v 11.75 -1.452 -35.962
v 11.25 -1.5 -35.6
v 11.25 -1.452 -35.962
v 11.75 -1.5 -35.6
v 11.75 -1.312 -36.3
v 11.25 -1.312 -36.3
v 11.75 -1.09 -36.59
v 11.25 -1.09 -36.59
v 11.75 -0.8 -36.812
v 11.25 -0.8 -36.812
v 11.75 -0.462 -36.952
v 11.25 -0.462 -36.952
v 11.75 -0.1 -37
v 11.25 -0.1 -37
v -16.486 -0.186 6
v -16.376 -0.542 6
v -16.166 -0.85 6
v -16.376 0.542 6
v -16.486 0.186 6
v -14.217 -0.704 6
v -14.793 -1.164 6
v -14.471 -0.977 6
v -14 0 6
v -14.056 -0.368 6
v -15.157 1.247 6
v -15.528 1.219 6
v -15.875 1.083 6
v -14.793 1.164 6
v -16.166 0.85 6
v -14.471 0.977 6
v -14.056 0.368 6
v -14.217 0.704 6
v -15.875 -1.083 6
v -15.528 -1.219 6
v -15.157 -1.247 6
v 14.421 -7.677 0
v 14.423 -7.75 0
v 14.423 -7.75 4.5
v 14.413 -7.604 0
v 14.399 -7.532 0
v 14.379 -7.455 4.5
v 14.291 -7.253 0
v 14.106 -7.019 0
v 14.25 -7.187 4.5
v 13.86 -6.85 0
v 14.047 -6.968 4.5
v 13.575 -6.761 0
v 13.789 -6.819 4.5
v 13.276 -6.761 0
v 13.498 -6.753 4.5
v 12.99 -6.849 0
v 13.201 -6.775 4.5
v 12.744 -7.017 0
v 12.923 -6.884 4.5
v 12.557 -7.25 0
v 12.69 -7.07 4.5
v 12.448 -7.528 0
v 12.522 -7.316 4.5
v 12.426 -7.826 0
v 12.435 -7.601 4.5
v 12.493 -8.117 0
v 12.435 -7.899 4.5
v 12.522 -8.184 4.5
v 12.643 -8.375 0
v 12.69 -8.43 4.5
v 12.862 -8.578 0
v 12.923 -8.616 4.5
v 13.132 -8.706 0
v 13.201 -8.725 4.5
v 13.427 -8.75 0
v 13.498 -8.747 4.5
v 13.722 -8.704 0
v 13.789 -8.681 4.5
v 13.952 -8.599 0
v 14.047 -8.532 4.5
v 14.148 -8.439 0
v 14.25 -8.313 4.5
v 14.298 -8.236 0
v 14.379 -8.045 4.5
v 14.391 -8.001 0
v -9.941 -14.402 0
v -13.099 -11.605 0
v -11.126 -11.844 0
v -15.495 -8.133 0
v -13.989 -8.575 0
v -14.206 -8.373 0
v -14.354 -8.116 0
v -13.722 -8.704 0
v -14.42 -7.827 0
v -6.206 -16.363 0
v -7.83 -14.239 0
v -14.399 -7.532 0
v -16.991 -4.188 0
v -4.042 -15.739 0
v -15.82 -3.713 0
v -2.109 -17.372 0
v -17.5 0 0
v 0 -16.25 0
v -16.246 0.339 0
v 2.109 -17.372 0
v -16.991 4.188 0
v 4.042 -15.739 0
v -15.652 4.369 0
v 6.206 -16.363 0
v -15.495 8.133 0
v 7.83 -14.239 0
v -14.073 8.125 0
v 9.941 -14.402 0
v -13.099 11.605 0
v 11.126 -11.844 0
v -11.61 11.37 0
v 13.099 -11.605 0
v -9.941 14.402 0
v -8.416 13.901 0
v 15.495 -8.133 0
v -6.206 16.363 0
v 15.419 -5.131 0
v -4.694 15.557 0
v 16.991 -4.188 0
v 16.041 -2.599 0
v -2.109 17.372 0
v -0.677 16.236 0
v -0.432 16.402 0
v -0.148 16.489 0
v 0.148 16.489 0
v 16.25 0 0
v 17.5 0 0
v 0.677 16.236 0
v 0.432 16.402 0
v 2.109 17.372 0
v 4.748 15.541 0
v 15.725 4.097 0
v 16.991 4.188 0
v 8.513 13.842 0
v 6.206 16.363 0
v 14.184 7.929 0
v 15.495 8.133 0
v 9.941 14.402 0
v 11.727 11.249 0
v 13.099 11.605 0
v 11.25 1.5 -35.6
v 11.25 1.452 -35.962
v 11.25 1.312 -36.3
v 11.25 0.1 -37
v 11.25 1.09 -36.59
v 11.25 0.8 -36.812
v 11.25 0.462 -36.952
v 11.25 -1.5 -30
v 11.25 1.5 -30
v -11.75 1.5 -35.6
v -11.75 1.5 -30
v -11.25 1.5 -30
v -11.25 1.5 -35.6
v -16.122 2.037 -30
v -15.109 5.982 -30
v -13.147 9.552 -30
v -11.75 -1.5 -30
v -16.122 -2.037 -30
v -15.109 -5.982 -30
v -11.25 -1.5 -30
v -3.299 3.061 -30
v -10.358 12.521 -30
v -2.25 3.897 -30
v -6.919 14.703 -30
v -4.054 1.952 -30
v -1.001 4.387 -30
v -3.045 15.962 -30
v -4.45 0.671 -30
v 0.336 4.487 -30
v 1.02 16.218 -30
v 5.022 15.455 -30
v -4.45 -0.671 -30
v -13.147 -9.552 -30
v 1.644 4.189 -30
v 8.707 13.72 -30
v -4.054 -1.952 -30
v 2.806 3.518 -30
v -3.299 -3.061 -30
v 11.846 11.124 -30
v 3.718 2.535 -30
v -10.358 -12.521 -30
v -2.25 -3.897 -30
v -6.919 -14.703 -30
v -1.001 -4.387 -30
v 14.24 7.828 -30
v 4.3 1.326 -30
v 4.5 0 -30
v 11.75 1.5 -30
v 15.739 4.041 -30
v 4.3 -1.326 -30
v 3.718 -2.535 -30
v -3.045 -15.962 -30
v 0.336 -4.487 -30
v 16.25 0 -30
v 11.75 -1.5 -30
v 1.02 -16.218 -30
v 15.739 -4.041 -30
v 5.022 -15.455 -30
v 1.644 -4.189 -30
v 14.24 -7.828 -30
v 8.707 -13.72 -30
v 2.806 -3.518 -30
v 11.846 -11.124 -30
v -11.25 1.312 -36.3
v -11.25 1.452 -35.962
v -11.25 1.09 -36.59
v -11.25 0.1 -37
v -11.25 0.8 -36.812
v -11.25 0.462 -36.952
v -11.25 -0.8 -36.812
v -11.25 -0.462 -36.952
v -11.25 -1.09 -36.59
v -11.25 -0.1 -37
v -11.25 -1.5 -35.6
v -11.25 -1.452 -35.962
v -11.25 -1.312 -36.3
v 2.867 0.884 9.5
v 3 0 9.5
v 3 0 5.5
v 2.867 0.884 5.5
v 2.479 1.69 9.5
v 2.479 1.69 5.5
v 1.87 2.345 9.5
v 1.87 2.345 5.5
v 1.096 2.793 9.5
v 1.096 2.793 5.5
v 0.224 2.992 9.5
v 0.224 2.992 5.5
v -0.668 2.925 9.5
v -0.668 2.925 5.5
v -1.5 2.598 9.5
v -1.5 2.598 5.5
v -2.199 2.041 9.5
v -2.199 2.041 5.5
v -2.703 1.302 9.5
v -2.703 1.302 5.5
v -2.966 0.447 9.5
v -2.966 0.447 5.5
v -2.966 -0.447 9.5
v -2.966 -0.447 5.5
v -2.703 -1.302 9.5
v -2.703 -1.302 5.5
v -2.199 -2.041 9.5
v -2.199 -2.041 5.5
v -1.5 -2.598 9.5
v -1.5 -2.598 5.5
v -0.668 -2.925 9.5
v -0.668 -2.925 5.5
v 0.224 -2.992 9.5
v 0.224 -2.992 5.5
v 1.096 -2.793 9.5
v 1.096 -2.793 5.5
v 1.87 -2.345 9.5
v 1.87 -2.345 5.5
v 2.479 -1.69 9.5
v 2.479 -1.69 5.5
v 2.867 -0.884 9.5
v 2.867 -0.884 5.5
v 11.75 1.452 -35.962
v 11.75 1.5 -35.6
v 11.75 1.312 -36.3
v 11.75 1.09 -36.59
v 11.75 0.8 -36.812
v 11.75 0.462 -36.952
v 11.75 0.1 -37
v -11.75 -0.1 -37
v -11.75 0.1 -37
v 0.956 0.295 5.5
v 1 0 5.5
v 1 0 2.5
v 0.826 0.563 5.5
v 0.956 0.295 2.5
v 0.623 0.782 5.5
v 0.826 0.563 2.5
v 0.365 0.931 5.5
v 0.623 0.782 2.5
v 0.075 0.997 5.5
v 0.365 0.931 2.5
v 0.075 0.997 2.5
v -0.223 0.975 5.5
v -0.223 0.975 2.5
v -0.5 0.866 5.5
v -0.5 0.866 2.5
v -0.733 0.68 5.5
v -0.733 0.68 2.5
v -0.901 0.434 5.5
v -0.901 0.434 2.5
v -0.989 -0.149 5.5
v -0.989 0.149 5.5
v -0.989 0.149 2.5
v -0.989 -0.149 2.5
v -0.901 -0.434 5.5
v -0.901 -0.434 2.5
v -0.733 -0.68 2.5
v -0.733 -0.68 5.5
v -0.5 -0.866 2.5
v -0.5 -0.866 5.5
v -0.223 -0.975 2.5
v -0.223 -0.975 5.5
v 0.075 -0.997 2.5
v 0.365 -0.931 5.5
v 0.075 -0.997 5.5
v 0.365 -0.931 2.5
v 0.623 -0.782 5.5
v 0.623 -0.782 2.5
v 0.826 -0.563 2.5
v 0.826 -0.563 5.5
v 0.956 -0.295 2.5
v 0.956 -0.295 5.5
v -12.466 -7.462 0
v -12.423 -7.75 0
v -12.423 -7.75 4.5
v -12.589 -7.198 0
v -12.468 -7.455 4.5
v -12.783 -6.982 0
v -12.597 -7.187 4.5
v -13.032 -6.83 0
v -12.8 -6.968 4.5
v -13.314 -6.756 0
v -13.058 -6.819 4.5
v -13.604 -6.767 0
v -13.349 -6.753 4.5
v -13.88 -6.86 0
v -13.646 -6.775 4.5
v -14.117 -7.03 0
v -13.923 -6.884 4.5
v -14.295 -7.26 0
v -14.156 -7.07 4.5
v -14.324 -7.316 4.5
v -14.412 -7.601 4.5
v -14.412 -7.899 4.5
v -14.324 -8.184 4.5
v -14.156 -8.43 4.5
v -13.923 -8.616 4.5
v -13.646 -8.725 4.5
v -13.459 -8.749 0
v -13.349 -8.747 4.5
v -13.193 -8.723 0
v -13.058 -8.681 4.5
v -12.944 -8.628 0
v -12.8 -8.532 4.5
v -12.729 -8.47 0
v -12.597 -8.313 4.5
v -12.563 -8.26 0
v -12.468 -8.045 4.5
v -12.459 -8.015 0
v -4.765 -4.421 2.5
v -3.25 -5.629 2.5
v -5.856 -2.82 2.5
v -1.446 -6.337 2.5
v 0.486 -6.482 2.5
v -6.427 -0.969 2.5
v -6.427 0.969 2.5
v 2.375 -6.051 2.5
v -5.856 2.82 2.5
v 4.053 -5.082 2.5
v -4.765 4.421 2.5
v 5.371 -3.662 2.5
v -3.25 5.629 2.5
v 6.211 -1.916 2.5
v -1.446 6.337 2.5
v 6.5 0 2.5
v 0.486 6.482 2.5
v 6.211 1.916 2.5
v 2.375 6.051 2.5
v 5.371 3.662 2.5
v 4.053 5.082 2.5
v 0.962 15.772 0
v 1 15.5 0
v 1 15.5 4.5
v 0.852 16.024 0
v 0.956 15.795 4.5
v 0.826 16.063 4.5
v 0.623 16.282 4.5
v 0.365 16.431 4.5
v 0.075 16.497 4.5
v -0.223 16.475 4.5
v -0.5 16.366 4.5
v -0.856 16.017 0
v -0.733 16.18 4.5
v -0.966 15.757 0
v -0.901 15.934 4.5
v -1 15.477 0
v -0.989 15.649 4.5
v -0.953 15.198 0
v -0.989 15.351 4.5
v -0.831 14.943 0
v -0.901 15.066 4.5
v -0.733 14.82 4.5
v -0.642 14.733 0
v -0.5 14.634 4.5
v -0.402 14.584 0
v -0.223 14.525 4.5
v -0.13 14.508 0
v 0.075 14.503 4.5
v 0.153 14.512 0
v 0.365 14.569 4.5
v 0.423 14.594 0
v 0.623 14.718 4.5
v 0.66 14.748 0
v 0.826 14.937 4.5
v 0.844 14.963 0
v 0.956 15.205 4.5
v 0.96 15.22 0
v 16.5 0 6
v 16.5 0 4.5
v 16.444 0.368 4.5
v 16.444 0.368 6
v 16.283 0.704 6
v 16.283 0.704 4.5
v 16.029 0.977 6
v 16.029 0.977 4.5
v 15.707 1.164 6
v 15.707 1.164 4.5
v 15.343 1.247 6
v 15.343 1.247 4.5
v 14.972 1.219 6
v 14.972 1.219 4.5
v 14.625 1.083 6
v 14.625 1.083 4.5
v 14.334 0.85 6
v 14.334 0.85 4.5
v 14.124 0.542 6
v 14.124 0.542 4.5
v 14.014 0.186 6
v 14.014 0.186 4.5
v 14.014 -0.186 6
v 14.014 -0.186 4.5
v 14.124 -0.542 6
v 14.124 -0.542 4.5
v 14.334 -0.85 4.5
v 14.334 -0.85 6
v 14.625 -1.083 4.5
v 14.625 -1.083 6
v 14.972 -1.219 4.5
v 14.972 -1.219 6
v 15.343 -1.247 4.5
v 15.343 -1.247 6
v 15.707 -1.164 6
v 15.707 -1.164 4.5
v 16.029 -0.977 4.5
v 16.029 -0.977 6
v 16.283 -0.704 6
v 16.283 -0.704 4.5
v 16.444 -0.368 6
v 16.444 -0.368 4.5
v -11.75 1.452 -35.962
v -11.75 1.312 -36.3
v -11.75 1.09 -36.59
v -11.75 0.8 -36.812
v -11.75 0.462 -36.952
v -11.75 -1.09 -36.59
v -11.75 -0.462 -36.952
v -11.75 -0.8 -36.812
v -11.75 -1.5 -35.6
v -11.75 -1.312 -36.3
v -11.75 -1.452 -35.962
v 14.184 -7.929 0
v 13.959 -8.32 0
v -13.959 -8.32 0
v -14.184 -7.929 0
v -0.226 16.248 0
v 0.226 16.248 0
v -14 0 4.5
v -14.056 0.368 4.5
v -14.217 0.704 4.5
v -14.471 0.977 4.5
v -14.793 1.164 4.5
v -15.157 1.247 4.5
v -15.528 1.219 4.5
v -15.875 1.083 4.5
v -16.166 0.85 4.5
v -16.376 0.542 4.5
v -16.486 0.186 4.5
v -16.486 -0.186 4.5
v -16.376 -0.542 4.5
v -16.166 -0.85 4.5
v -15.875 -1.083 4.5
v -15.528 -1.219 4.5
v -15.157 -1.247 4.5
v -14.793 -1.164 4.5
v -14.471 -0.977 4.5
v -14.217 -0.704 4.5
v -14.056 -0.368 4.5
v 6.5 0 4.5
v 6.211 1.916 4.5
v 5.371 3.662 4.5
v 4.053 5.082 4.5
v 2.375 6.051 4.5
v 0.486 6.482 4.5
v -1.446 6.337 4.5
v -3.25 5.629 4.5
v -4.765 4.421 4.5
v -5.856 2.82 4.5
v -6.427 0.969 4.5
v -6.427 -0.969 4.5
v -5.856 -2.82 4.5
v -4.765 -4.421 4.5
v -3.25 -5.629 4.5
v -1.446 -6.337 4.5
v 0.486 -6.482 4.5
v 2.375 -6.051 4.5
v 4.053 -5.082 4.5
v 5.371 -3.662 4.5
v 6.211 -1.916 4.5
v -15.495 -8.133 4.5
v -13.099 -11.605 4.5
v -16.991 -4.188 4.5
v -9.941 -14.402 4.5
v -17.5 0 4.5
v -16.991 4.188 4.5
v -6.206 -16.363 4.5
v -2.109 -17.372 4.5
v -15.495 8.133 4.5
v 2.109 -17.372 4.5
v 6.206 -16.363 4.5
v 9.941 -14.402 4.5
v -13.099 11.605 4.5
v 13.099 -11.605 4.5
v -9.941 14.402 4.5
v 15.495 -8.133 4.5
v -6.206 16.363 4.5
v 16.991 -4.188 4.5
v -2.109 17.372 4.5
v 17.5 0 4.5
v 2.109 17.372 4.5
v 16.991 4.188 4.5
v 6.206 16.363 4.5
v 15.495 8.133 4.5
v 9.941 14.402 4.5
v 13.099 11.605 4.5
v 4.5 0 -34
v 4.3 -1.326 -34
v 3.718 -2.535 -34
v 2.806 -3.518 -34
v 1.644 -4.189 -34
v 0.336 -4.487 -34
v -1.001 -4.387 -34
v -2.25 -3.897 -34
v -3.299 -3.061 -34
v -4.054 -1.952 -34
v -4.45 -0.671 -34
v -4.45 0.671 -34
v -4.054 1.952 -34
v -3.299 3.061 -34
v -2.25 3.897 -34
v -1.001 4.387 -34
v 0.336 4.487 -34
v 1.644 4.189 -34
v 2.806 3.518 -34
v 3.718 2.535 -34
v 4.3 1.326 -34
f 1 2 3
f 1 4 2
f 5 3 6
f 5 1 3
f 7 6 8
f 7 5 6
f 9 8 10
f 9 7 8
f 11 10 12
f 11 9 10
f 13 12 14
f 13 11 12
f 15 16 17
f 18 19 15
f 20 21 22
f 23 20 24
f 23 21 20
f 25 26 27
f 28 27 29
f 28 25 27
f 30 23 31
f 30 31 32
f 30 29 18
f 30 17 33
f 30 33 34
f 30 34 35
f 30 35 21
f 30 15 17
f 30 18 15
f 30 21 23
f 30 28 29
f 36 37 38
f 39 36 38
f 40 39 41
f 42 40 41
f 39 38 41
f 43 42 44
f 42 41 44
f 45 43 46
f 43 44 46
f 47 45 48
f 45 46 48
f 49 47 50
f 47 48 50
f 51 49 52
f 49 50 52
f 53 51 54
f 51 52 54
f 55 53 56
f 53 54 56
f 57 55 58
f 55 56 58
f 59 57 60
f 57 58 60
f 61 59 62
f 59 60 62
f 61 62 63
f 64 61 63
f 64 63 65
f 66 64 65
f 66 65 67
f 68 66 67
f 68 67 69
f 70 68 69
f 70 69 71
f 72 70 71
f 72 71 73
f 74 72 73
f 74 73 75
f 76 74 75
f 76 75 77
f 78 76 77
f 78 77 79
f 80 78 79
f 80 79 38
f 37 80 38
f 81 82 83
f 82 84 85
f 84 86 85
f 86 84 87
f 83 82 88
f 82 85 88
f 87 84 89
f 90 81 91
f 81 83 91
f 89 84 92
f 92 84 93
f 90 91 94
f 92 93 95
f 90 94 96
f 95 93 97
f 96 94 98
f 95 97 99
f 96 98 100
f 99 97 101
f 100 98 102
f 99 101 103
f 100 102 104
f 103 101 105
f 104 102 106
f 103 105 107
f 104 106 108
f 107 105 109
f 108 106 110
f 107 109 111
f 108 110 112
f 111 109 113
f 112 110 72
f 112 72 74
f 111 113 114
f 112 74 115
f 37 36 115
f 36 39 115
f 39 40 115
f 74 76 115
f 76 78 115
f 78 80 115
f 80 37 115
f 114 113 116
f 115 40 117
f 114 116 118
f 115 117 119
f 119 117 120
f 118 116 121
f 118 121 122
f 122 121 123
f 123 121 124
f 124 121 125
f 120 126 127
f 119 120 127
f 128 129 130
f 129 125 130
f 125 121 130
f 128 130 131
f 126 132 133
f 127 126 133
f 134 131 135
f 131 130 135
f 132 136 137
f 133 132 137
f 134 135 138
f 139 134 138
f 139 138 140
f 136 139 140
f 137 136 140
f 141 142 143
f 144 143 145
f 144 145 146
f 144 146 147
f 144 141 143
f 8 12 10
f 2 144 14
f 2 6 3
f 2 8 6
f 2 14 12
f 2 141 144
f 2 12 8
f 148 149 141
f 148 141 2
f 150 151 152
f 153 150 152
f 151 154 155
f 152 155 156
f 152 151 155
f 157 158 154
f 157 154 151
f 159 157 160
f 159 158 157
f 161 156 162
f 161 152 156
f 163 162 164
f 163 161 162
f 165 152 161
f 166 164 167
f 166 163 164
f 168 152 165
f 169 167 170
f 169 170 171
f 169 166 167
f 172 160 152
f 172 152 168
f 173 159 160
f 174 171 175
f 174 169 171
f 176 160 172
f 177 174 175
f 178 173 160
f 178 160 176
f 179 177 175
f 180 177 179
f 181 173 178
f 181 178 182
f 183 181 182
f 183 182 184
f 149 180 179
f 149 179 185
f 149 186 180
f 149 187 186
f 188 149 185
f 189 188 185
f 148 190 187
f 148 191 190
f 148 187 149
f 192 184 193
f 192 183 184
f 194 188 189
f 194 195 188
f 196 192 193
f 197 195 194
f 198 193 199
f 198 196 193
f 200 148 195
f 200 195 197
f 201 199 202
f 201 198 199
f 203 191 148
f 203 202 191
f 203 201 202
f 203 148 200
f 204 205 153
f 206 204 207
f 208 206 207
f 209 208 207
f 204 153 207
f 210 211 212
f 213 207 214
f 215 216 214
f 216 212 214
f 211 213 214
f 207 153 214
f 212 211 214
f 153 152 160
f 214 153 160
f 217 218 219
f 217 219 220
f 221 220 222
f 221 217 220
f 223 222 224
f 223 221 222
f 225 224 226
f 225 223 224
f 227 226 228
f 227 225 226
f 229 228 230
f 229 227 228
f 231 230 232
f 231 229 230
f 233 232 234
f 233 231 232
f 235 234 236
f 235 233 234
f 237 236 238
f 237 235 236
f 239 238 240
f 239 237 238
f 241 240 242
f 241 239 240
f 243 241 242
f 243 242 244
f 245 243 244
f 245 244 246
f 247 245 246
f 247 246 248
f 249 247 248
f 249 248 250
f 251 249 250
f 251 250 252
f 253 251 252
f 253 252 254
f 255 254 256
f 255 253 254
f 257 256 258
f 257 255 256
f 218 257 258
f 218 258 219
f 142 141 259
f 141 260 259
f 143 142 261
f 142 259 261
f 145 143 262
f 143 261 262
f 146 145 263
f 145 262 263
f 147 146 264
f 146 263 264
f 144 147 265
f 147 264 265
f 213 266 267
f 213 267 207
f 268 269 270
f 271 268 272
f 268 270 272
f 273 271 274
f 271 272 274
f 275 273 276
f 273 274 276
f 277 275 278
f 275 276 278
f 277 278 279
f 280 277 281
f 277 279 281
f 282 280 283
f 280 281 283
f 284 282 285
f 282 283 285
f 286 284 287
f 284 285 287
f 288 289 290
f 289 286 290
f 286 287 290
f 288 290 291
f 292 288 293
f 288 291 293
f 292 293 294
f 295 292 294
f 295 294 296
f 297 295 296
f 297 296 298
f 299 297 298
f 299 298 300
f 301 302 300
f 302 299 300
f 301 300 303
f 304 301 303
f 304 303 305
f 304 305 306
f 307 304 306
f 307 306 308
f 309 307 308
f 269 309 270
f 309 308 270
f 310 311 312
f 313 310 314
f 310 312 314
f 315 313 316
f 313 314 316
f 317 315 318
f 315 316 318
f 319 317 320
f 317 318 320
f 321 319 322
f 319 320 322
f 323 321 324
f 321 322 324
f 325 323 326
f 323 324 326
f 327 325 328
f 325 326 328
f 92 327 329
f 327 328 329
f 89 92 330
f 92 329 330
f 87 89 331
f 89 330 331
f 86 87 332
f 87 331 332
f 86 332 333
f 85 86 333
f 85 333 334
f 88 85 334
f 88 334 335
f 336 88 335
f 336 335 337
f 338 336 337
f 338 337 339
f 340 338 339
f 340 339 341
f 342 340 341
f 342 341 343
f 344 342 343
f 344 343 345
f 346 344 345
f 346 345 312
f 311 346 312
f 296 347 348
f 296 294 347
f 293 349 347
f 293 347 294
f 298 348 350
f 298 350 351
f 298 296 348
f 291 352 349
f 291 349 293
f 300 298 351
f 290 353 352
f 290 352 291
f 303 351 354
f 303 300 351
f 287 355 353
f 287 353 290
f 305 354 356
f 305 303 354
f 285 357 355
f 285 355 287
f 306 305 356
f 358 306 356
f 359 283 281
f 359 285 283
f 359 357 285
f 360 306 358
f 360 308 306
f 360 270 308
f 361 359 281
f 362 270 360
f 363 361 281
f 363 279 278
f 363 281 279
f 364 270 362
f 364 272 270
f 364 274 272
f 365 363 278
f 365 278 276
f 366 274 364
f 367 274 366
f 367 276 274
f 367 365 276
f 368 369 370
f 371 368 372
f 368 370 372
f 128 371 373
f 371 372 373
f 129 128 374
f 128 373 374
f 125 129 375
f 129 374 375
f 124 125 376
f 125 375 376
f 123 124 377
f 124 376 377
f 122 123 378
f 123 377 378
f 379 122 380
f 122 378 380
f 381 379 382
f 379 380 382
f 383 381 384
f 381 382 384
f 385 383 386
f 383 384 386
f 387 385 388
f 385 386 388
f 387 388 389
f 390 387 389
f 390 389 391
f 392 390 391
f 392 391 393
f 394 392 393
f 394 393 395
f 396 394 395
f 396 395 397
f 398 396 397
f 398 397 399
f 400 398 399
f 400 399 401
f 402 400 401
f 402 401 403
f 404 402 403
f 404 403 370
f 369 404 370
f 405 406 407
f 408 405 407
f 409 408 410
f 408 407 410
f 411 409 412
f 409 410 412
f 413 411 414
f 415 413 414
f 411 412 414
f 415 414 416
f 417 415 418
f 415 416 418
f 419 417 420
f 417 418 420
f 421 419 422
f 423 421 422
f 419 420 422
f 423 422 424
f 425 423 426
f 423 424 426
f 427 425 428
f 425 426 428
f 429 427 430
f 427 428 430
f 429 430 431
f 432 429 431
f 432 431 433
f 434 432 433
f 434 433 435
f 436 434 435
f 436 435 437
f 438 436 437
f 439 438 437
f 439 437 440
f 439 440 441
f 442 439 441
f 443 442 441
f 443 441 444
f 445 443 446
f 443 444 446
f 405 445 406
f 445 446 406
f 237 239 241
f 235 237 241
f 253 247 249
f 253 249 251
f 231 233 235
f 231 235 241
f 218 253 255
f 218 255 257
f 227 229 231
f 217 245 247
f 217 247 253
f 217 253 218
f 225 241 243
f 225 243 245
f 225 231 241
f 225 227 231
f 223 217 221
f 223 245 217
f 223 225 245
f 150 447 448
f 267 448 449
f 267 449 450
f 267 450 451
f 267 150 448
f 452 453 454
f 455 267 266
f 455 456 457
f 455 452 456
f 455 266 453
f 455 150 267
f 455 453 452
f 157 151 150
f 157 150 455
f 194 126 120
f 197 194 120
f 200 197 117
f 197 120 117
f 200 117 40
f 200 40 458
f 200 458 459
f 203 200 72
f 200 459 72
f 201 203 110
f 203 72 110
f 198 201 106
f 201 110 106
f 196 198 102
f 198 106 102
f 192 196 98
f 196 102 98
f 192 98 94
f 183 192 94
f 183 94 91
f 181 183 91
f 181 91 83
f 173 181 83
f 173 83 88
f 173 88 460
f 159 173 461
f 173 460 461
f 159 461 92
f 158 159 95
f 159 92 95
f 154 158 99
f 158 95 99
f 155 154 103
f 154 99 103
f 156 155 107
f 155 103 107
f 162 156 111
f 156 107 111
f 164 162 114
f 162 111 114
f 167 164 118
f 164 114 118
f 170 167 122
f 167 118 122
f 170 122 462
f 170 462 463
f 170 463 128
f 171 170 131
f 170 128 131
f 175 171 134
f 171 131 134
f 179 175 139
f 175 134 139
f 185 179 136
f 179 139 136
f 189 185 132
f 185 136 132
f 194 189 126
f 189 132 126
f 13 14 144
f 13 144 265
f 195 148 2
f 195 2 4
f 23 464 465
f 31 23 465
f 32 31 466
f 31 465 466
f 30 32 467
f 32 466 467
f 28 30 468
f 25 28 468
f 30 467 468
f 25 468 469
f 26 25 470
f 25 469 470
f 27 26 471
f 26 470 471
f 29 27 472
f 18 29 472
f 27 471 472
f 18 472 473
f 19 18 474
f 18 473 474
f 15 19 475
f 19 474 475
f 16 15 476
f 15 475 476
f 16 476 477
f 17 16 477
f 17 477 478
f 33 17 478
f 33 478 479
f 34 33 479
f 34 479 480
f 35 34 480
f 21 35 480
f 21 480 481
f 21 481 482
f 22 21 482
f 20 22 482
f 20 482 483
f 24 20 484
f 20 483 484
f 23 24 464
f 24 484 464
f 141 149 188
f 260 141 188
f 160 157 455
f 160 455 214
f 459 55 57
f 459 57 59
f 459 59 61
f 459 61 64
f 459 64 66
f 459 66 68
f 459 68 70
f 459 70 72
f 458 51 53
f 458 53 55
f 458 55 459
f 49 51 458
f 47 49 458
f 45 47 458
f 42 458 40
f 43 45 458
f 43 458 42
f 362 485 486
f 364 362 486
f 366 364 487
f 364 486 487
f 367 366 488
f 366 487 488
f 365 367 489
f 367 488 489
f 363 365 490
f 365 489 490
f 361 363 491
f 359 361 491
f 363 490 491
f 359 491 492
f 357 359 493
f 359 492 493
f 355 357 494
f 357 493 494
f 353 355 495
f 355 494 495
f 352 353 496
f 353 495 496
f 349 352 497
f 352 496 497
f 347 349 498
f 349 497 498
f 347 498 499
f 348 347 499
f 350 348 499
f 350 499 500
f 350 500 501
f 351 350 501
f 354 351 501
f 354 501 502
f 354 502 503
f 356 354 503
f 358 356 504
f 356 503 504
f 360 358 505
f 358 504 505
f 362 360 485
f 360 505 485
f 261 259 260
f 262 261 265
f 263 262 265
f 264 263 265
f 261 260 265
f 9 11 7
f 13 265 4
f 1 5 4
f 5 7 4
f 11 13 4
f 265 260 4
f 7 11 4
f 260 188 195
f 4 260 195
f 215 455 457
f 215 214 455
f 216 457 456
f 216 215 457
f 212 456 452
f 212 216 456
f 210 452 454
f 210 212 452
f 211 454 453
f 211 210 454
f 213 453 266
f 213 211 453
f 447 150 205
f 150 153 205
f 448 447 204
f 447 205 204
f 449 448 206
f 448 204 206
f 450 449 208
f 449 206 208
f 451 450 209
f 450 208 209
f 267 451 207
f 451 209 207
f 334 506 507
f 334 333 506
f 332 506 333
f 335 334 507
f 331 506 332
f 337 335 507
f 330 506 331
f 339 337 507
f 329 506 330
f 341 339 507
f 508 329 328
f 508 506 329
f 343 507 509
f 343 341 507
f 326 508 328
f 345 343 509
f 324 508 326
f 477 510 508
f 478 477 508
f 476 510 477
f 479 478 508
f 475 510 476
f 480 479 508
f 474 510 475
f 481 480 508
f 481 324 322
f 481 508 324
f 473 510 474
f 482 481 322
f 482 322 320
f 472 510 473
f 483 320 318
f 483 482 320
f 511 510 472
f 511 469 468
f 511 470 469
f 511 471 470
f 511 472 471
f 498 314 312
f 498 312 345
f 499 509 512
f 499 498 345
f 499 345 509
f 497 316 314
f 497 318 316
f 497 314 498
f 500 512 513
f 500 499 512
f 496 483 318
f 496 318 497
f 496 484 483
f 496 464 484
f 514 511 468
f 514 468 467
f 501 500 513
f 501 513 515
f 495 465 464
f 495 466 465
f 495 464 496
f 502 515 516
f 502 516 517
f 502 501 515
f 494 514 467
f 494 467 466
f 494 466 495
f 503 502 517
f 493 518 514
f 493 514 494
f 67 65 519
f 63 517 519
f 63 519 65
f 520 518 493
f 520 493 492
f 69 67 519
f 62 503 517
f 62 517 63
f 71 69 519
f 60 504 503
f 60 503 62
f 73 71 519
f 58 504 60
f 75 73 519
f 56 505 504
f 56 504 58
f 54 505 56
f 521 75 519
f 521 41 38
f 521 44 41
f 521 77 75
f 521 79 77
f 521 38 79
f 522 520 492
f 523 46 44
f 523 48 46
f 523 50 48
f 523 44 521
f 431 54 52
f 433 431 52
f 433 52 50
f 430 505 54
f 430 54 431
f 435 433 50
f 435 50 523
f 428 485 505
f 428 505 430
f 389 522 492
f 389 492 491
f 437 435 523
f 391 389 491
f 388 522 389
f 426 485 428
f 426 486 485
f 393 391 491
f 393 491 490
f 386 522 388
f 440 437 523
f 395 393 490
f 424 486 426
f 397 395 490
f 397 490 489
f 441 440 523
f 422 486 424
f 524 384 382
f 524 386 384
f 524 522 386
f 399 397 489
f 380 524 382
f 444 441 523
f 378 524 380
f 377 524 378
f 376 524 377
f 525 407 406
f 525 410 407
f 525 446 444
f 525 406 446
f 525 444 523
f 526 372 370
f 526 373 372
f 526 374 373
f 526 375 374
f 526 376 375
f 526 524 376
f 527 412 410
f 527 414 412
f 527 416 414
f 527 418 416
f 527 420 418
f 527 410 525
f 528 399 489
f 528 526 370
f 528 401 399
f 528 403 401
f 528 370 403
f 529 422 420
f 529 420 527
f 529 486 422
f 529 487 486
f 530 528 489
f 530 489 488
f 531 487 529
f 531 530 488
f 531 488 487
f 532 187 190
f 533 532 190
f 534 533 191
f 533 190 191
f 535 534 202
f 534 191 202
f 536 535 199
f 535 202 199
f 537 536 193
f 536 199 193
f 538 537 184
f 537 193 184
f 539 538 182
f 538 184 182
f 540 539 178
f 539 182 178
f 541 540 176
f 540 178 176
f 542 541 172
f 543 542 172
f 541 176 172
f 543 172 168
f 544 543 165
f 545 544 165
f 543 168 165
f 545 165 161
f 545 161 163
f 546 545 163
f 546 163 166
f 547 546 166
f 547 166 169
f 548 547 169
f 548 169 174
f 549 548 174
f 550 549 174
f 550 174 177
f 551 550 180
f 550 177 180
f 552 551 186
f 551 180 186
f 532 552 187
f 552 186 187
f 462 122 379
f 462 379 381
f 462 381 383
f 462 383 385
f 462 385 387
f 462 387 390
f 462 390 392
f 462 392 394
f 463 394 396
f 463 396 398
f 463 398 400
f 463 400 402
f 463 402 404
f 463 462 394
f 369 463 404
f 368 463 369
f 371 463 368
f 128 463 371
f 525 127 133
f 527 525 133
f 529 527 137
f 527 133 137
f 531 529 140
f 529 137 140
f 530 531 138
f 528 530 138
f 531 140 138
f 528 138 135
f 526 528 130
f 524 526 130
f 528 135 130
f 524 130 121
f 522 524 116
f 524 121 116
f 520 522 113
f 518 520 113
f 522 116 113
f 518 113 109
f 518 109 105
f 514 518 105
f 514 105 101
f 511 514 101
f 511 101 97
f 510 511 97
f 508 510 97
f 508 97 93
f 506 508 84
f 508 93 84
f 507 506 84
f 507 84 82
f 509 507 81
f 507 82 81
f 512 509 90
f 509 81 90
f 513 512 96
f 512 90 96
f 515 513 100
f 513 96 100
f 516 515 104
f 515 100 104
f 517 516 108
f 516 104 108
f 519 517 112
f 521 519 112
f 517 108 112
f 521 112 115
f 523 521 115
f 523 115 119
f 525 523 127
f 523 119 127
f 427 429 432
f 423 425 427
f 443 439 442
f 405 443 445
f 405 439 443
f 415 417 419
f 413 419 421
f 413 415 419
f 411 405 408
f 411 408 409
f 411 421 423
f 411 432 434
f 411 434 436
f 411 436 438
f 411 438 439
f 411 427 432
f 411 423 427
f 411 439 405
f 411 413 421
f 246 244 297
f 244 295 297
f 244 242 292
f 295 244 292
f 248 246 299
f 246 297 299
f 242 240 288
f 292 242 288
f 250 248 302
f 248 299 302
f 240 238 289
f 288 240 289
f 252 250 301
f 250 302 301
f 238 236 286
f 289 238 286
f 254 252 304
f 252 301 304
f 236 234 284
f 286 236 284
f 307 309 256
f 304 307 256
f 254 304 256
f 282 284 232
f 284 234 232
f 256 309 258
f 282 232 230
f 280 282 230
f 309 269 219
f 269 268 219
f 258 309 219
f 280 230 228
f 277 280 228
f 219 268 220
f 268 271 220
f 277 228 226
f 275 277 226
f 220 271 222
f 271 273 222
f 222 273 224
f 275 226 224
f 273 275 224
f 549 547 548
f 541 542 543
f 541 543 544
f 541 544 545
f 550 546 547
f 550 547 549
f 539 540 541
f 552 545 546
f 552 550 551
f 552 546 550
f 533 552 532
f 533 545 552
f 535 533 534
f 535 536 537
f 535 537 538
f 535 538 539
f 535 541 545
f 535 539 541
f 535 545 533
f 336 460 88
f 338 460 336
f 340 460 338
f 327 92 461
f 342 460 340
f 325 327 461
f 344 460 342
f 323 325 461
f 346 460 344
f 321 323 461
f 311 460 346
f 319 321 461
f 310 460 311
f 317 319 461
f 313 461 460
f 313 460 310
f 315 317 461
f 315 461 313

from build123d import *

# Parameters (mm, degrees)
SKETCH_R        = 17.5
PAD_DEPTH       = 4.5
SKETCH001_R     = 16.25
PAD001_DEPTH    = 30
SKETCH002_R     = 4.5
PAD002_DEPTH    = 4
SKETCH003_W     = 0.5
SKETCH003_H     = 3
PAD003_DEPTH    = 7
FILLET_R        = 1.4
SKETCH004_R     = 1.25
PAD004_DEPTH    = 1.5
SKETCH005_R     = 1
POCKET_DEPTH    = 4.5
SKETCH006_R     = 6.5
POCKET001_DEPTH = 2
SKETCH007_R     = 1
PAD005_DEPTH    = 7
SKETCH008_R     = 3
PAD006_DEPTH    = 4


with BuildPart() as part:
    # Sketch → Pad (new body)
    with BuildSketch(Plane.XY):
        Circle(SKETCH_R)
    extrude(amount=PAD_DEPTH)

    # Sketch001 (on Face2 of Pad) → Pad001 (join)
    with BuildSketch(Plane(origin=(0, 0, 0), x_dir=(1, 0, 0), z_dir=(0, 0, -1))):
        Circle(SKETCH001_R)
    extrude(amount=PAD001_DEPTH)

    # Sketch002 (on Face5 of Pad001) → Pad002 (join)
    with BuildSketch(Plane(origin=(0, 0, -30), x_dir=(1, 0, 0), z_dir=(0, 0, -1))):
        Circle(SKETCH002_R)
    extrude(amount=PAD002_DEPTH)

    # Sketch003 (on Face5 of Pad002) → Pad003 (join)
    with BuildSketch(Plane(origin=(0, 0, -30), x_dir=(1, 0, 0), z_dir=(0, 0, -1))):
        with Locations((11.5, 0)):
            Rectangle(SKETCH003_W, SKETCH003_H)
        with Locations((-11.5, 0)):
            Rectangle(SKETCH003_W, SKETCH003_H)
    extrude(amount=PAD003_DEPTH)

    # Fillet
    fillet_edges = [part.edges().sort_by_distance(p)[0] for p in [
        (11.5, -1.5, -37),
        (11.5, 1.5, -37),
        (-11.5, 1.5, -37),
        (-11.5, -1.5, -37),
    ]]
    fillet(fillet_edges, radius=FILLET_R)

    # Sketch004 (on Face21 of Fillet) → Pad004 (join)
    with BuildSketch(Plane.XY.offset(4.5)):
        with Locations((-15.25, 0)):
            Circle(SKETCH004_R)
        with Locations((15.25, 0)):
            Circle(SKETCH004_R)
    extrude(amount=PAD004_DEPTH)

    # Sketch005 (on Face21 of Pad004) → Pocket (cut)
    with BuildSketch(Plane.XY.offset(4.5)):
        with Locations((0, 15.5)):
            Circle(SKETCH005_R)
        with Locations((-13.423394, -7.75)):
            Circle(SKETCH005_R)
        with Locations((13.423394, -7.75)):
            Circle(SKETCH005_R)
    extrude(amount=-POCKET_DEPTH, mode=Mode.SUBTRACT)

    # Sketch006 (on Face27 of Pocket) → Pocket001 (cut)
    with BuildSketch(Plane.XY.offset(4.5)):
        Circle(SKETCH006_R)
    extrude(amount=-POCKET001_DEPTH, mode=Mode.SUBTRACT)

    # Sketch007 (on Face32 of Pocket001) → Pad005 (join)
    with BuildSketch(Plane.XY.offset(2.5)):
        Circle(SKETCH007_R)
    extrude(amount=PAD005_DEPTH)

    # Sketch008 (on Face35 of Pad005) → Pad006 (join)
    with BuildSketch(Plane.XY.offset(9.5)):
        Circle(SKETCH008_R)
    extrude(amount=-PAD006_DEPTH)


solid = part.part
